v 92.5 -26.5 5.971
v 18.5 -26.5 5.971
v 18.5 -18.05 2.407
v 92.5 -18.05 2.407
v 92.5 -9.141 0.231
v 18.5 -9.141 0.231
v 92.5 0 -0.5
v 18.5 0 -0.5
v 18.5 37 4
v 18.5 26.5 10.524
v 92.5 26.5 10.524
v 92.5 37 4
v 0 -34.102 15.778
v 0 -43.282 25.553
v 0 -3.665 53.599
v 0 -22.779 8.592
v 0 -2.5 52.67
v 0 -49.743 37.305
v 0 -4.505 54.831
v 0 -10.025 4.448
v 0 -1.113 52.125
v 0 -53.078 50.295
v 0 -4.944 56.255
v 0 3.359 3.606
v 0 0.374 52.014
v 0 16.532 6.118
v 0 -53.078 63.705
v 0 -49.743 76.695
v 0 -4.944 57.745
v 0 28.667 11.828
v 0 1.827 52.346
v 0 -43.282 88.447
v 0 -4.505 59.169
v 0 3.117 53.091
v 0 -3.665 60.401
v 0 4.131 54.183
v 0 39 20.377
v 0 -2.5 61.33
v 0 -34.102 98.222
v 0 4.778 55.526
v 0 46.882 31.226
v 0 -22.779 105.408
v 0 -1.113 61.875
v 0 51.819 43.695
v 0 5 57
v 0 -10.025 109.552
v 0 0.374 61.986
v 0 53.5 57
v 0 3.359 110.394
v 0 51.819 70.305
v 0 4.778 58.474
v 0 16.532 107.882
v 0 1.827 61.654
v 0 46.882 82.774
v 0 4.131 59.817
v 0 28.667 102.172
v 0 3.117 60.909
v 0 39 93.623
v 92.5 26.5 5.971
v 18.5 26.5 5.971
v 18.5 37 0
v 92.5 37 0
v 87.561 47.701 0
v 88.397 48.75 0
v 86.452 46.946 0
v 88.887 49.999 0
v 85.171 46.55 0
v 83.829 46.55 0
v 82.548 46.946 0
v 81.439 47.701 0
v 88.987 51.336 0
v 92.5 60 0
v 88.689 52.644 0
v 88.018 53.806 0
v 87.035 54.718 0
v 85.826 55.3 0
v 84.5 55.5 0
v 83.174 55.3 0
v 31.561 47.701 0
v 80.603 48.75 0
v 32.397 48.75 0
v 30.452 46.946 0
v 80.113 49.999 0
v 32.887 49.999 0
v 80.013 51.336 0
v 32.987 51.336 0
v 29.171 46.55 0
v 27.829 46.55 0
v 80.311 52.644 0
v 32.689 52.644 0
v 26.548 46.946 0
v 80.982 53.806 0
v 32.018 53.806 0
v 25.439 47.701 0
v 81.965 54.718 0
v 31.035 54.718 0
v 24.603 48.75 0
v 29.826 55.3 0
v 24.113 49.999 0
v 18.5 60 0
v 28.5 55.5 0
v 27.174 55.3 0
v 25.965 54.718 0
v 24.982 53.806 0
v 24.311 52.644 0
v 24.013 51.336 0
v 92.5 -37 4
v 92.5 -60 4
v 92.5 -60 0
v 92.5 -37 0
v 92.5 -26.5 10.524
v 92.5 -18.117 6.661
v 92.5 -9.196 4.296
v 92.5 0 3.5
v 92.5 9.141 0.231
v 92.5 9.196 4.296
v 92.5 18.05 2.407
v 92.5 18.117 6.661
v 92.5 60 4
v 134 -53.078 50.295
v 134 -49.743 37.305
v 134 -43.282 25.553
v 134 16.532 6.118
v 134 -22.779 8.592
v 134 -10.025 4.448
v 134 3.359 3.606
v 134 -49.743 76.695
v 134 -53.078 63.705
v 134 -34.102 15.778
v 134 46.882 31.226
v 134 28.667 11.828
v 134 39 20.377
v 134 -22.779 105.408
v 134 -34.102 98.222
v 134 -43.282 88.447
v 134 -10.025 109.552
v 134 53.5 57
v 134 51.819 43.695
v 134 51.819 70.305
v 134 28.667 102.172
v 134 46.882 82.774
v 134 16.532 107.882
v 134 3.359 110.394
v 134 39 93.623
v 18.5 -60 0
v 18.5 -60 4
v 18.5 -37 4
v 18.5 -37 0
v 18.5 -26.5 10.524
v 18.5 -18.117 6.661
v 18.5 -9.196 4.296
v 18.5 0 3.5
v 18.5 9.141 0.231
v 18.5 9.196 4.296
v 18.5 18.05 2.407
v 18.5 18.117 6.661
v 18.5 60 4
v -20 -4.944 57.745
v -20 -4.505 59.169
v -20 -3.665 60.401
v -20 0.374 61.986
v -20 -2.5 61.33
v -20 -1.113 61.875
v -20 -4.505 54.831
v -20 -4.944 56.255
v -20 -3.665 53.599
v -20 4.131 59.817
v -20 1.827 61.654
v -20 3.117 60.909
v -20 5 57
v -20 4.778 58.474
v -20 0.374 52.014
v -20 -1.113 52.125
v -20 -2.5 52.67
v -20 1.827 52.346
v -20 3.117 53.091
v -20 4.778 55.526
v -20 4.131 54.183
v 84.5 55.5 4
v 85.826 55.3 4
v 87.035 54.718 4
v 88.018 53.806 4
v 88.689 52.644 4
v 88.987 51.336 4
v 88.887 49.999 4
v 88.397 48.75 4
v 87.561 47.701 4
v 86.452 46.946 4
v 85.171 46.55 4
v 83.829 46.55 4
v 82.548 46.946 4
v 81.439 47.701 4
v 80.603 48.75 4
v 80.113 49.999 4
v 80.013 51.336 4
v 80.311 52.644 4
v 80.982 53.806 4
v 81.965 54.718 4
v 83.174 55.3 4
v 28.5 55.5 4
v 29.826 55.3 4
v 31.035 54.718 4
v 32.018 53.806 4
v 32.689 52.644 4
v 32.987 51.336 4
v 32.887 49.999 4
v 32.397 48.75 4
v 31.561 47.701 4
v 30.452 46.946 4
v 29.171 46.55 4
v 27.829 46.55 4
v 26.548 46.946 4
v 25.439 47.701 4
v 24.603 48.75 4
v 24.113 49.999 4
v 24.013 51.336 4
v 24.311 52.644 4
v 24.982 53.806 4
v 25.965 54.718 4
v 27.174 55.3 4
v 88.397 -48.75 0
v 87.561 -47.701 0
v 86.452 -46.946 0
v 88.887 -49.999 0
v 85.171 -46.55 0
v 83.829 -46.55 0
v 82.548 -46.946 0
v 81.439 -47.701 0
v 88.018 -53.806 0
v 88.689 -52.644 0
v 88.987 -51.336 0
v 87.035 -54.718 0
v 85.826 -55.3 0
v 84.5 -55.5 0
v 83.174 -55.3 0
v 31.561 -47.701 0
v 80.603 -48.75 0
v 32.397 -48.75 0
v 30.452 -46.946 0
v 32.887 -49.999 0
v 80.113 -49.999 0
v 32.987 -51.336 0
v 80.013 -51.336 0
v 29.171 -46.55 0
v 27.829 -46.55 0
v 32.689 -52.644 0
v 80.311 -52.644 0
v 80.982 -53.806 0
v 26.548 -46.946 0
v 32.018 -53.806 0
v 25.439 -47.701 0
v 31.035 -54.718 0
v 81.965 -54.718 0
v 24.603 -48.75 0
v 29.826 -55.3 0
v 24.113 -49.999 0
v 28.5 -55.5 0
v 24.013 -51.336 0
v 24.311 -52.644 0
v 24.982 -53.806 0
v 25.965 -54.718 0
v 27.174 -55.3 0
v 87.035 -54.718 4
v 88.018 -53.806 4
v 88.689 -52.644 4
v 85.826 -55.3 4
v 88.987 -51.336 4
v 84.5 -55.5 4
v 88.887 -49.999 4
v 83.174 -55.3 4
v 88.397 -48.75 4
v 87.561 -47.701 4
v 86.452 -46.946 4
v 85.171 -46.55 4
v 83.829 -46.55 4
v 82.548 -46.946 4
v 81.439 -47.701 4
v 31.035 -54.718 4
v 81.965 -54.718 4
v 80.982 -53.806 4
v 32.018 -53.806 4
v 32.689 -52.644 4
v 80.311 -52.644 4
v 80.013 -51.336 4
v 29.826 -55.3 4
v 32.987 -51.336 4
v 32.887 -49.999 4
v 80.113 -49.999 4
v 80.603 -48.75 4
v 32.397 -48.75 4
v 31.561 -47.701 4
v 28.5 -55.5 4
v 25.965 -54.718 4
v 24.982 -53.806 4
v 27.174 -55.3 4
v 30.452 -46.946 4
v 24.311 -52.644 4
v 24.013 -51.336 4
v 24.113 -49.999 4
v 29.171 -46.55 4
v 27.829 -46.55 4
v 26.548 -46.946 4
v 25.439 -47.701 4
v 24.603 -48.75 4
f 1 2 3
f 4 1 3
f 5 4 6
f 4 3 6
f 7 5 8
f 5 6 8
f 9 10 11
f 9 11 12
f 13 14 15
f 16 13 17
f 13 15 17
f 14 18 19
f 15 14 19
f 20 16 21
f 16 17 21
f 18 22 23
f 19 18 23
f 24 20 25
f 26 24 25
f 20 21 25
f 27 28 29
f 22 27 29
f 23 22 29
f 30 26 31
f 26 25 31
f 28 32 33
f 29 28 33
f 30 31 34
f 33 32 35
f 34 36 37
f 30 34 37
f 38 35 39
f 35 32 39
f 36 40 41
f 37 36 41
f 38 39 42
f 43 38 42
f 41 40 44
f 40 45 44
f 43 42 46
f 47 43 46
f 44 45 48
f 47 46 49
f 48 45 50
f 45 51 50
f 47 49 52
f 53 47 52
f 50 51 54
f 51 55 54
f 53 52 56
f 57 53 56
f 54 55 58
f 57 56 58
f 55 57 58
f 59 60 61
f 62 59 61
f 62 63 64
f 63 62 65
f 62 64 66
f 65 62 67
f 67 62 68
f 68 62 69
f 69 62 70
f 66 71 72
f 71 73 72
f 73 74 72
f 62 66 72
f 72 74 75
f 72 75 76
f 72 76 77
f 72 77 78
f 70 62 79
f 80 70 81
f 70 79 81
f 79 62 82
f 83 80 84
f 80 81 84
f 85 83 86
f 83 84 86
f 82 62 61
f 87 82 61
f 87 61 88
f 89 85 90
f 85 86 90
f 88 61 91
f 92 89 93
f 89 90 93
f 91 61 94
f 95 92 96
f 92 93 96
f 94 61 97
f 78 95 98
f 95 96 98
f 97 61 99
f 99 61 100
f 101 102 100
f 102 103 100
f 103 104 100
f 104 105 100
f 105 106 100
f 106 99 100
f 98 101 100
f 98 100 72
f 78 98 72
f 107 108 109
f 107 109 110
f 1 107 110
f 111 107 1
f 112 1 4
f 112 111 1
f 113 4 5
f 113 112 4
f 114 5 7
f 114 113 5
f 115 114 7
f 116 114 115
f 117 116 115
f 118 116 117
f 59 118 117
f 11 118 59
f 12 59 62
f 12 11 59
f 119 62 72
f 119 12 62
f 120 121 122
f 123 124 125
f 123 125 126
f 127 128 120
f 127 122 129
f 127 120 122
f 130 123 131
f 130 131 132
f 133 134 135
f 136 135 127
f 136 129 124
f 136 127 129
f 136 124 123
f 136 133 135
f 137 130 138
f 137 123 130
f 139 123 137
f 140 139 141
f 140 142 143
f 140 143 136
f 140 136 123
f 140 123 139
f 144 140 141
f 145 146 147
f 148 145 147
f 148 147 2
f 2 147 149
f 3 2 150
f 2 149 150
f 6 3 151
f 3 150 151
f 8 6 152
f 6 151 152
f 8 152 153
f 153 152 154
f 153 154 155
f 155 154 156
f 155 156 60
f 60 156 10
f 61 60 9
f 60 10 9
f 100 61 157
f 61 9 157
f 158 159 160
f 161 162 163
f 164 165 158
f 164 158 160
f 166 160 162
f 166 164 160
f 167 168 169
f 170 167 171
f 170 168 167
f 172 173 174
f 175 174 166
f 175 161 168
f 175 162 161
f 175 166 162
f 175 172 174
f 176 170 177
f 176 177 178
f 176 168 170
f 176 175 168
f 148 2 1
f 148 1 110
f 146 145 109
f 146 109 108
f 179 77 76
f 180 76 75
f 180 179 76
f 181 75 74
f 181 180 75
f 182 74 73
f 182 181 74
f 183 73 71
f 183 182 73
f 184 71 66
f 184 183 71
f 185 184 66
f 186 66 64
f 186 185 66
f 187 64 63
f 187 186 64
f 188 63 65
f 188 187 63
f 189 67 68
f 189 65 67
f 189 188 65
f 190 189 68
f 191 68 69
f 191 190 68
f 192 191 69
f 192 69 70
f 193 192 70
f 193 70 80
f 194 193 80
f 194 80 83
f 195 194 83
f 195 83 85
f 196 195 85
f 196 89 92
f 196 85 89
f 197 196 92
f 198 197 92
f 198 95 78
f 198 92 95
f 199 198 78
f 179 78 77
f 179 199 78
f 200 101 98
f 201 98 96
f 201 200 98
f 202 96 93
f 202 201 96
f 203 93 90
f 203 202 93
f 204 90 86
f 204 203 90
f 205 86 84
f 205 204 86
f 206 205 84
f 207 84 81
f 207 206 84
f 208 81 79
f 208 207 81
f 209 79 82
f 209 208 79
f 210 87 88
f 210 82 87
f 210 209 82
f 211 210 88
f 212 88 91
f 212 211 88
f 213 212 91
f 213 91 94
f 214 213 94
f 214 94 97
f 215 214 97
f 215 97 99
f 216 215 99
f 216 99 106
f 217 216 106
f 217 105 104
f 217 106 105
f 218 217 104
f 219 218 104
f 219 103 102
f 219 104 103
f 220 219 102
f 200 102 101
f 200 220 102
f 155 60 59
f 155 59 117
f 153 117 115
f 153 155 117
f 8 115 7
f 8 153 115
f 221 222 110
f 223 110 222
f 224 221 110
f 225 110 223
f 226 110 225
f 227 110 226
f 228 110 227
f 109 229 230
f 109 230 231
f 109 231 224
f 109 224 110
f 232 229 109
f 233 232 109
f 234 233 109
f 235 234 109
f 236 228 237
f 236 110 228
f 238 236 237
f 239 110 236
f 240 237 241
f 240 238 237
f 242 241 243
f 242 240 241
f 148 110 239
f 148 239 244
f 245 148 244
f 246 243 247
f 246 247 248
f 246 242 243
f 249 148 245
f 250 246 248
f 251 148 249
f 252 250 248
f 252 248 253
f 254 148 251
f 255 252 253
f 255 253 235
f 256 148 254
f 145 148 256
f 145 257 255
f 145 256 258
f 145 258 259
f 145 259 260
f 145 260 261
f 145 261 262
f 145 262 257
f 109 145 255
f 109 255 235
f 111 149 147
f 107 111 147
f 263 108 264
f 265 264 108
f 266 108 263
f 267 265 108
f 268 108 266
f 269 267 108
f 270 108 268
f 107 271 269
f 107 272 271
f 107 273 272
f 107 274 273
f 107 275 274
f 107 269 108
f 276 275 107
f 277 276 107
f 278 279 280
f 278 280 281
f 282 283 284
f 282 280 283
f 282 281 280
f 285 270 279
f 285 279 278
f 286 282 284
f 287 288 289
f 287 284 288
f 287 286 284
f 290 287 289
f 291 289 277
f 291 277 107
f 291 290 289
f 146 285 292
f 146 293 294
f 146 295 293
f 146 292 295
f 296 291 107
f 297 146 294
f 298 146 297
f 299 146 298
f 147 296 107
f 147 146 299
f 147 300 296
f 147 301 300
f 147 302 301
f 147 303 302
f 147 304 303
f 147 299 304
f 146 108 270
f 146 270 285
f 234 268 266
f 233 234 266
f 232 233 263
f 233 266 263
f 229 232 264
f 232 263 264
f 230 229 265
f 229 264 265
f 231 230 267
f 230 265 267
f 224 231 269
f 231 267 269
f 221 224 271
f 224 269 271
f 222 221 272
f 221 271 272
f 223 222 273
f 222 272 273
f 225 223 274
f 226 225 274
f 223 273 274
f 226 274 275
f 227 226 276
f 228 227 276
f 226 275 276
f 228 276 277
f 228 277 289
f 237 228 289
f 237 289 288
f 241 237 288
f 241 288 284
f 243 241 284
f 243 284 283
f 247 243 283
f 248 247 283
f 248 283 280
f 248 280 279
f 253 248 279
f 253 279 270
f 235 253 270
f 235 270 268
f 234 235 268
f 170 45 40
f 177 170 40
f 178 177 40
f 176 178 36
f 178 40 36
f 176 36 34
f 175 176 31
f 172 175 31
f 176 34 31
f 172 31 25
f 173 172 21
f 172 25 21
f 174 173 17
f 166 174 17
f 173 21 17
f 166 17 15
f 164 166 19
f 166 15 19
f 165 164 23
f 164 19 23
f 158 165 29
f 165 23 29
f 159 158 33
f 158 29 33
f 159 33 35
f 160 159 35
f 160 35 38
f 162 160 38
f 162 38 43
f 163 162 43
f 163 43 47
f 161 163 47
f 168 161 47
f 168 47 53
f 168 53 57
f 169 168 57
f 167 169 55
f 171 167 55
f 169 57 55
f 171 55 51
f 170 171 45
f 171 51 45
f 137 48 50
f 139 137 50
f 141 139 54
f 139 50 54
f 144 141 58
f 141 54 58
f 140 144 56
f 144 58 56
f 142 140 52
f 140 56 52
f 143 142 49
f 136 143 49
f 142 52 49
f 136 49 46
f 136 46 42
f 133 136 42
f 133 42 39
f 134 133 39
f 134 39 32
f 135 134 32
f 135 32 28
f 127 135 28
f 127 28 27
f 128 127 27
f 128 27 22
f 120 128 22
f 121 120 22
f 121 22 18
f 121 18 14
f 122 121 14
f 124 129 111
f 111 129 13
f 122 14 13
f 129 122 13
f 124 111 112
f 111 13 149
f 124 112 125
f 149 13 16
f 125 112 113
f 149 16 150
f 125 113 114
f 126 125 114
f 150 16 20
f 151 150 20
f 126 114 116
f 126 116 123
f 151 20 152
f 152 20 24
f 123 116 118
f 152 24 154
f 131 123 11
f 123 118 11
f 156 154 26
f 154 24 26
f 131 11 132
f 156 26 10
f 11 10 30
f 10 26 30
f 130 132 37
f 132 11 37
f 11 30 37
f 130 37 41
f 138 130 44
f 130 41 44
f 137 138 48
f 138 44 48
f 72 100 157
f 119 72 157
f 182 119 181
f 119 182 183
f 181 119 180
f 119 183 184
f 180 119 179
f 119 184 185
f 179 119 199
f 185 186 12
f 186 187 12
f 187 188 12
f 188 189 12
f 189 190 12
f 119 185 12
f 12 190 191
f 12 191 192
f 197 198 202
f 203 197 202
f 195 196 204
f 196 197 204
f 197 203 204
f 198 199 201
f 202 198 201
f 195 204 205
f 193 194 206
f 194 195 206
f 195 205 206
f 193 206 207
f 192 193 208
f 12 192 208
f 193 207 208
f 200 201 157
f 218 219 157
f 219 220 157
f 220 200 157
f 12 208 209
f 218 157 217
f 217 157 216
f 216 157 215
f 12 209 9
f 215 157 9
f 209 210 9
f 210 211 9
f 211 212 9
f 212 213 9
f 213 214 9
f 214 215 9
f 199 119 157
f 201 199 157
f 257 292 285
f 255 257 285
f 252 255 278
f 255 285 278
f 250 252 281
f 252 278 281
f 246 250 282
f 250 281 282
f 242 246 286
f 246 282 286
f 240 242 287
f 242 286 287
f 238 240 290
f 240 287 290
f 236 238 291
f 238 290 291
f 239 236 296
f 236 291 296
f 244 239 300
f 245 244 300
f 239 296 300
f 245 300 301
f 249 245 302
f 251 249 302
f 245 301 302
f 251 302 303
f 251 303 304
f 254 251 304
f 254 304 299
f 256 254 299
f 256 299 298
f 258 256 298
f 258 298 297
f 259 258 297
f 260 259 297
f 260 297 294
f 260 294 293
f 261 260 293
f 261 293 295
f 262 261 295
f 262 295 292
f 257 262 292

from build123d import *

# Parameters (mm, degrees)
SKETCH_R     = 53.5
PAD_DEPTH    = 134
SKETCH004_R  = 5
PAD002_DEPTH = 20
PAD001_DEPTH = 74
SKETCH002_R  = 4.5
POCKET_DEPTH = 5


with BuildPart() as motorbody:
    # Sketch → Pad (new body)
    with BuildSketch(Plane.YZ):
        Circle(SKETCH_R)
    extrude(amount=PAD_DEPTH)

    # Sketch004 (on Face2 of Pad) → Pad002 (join)
    with BuildSketch(Plane(origin=(0, 0, 0), x_dir=(0, 1, 0), z_dir=(-1, 0, 0))):
        Circle(SKETCH004_R)
    extrude(amount=PAD002_DEPTH)


with BuildPart() as motor:
    # Sketch001 → Pad001 (new body)
    with BuildSketch(Plane.YZ):
        with BuildLine():
            ThreePointArc((-26.5, -46.4758001545), (-13.7075652786, -51.7141436566), (0, -53.5))
            Line((0, -53.5), (0, -57.5))
            ThreePointArc((-26.5, -51.0294032887), (-13.6392688752, -55.8589325404), (0, -57.5))
            Line((-26.5, -51.0294032887), (-37, -57))
            Line((-37, -57), (-60, -57))
            Line((-60, -57), (-60, -53))
            Line((-60, -53), (-37, -53))
            Line((-26.5, -46.4758001545), (-37, -53))
        make_face()
    pad001 = extrude(amount=PAD001_DEPTH)

    # Sketch002 (on Face4 of Pad001) → Pocket (cut)
    with BuildSketch(Plane(origin=(0, 0, -53), x_dir=(0, -1, 0), z_dir=(0, 0, 1))):
        with Locations((51, 66)):
            Circle(SKETCH002_R)
        with Locations((51, 10)):
            Circle(SKETCH002_R)
    pocket = extrude(amount=-POCKET_DEPTH, mode=Mode.SUBTRACT)

    # Mirrored: Pad001 across Sketch001 V_Axis
    add(pad001.mirror(Plane(origin=(0, 0, 0), x_dir=(1, 0, 0), z_dir=(0, 1, 0))))

    # Mirrored001: Pocket across Sketch002 V_Axis
    add(pocket.mirror(Plane(origin=(0, 0, -53), x_dir=(0, 0, 1), z_dir=(0, -1, 0))), mode=Mode.SUBTRACT)


with BuildPart() as motor_1:
    # Body001 placement: moved
    add(motor.part.moved(Location((18.5, 0, 0))))

    # Connect: union MotorBody
    add(motorbody.part)


with BuildPart() as motor_2:
    # Connect placement: moved
    add(motor_1.part.moved(Location((0, 0, 57))))


solid = motor_2.part
